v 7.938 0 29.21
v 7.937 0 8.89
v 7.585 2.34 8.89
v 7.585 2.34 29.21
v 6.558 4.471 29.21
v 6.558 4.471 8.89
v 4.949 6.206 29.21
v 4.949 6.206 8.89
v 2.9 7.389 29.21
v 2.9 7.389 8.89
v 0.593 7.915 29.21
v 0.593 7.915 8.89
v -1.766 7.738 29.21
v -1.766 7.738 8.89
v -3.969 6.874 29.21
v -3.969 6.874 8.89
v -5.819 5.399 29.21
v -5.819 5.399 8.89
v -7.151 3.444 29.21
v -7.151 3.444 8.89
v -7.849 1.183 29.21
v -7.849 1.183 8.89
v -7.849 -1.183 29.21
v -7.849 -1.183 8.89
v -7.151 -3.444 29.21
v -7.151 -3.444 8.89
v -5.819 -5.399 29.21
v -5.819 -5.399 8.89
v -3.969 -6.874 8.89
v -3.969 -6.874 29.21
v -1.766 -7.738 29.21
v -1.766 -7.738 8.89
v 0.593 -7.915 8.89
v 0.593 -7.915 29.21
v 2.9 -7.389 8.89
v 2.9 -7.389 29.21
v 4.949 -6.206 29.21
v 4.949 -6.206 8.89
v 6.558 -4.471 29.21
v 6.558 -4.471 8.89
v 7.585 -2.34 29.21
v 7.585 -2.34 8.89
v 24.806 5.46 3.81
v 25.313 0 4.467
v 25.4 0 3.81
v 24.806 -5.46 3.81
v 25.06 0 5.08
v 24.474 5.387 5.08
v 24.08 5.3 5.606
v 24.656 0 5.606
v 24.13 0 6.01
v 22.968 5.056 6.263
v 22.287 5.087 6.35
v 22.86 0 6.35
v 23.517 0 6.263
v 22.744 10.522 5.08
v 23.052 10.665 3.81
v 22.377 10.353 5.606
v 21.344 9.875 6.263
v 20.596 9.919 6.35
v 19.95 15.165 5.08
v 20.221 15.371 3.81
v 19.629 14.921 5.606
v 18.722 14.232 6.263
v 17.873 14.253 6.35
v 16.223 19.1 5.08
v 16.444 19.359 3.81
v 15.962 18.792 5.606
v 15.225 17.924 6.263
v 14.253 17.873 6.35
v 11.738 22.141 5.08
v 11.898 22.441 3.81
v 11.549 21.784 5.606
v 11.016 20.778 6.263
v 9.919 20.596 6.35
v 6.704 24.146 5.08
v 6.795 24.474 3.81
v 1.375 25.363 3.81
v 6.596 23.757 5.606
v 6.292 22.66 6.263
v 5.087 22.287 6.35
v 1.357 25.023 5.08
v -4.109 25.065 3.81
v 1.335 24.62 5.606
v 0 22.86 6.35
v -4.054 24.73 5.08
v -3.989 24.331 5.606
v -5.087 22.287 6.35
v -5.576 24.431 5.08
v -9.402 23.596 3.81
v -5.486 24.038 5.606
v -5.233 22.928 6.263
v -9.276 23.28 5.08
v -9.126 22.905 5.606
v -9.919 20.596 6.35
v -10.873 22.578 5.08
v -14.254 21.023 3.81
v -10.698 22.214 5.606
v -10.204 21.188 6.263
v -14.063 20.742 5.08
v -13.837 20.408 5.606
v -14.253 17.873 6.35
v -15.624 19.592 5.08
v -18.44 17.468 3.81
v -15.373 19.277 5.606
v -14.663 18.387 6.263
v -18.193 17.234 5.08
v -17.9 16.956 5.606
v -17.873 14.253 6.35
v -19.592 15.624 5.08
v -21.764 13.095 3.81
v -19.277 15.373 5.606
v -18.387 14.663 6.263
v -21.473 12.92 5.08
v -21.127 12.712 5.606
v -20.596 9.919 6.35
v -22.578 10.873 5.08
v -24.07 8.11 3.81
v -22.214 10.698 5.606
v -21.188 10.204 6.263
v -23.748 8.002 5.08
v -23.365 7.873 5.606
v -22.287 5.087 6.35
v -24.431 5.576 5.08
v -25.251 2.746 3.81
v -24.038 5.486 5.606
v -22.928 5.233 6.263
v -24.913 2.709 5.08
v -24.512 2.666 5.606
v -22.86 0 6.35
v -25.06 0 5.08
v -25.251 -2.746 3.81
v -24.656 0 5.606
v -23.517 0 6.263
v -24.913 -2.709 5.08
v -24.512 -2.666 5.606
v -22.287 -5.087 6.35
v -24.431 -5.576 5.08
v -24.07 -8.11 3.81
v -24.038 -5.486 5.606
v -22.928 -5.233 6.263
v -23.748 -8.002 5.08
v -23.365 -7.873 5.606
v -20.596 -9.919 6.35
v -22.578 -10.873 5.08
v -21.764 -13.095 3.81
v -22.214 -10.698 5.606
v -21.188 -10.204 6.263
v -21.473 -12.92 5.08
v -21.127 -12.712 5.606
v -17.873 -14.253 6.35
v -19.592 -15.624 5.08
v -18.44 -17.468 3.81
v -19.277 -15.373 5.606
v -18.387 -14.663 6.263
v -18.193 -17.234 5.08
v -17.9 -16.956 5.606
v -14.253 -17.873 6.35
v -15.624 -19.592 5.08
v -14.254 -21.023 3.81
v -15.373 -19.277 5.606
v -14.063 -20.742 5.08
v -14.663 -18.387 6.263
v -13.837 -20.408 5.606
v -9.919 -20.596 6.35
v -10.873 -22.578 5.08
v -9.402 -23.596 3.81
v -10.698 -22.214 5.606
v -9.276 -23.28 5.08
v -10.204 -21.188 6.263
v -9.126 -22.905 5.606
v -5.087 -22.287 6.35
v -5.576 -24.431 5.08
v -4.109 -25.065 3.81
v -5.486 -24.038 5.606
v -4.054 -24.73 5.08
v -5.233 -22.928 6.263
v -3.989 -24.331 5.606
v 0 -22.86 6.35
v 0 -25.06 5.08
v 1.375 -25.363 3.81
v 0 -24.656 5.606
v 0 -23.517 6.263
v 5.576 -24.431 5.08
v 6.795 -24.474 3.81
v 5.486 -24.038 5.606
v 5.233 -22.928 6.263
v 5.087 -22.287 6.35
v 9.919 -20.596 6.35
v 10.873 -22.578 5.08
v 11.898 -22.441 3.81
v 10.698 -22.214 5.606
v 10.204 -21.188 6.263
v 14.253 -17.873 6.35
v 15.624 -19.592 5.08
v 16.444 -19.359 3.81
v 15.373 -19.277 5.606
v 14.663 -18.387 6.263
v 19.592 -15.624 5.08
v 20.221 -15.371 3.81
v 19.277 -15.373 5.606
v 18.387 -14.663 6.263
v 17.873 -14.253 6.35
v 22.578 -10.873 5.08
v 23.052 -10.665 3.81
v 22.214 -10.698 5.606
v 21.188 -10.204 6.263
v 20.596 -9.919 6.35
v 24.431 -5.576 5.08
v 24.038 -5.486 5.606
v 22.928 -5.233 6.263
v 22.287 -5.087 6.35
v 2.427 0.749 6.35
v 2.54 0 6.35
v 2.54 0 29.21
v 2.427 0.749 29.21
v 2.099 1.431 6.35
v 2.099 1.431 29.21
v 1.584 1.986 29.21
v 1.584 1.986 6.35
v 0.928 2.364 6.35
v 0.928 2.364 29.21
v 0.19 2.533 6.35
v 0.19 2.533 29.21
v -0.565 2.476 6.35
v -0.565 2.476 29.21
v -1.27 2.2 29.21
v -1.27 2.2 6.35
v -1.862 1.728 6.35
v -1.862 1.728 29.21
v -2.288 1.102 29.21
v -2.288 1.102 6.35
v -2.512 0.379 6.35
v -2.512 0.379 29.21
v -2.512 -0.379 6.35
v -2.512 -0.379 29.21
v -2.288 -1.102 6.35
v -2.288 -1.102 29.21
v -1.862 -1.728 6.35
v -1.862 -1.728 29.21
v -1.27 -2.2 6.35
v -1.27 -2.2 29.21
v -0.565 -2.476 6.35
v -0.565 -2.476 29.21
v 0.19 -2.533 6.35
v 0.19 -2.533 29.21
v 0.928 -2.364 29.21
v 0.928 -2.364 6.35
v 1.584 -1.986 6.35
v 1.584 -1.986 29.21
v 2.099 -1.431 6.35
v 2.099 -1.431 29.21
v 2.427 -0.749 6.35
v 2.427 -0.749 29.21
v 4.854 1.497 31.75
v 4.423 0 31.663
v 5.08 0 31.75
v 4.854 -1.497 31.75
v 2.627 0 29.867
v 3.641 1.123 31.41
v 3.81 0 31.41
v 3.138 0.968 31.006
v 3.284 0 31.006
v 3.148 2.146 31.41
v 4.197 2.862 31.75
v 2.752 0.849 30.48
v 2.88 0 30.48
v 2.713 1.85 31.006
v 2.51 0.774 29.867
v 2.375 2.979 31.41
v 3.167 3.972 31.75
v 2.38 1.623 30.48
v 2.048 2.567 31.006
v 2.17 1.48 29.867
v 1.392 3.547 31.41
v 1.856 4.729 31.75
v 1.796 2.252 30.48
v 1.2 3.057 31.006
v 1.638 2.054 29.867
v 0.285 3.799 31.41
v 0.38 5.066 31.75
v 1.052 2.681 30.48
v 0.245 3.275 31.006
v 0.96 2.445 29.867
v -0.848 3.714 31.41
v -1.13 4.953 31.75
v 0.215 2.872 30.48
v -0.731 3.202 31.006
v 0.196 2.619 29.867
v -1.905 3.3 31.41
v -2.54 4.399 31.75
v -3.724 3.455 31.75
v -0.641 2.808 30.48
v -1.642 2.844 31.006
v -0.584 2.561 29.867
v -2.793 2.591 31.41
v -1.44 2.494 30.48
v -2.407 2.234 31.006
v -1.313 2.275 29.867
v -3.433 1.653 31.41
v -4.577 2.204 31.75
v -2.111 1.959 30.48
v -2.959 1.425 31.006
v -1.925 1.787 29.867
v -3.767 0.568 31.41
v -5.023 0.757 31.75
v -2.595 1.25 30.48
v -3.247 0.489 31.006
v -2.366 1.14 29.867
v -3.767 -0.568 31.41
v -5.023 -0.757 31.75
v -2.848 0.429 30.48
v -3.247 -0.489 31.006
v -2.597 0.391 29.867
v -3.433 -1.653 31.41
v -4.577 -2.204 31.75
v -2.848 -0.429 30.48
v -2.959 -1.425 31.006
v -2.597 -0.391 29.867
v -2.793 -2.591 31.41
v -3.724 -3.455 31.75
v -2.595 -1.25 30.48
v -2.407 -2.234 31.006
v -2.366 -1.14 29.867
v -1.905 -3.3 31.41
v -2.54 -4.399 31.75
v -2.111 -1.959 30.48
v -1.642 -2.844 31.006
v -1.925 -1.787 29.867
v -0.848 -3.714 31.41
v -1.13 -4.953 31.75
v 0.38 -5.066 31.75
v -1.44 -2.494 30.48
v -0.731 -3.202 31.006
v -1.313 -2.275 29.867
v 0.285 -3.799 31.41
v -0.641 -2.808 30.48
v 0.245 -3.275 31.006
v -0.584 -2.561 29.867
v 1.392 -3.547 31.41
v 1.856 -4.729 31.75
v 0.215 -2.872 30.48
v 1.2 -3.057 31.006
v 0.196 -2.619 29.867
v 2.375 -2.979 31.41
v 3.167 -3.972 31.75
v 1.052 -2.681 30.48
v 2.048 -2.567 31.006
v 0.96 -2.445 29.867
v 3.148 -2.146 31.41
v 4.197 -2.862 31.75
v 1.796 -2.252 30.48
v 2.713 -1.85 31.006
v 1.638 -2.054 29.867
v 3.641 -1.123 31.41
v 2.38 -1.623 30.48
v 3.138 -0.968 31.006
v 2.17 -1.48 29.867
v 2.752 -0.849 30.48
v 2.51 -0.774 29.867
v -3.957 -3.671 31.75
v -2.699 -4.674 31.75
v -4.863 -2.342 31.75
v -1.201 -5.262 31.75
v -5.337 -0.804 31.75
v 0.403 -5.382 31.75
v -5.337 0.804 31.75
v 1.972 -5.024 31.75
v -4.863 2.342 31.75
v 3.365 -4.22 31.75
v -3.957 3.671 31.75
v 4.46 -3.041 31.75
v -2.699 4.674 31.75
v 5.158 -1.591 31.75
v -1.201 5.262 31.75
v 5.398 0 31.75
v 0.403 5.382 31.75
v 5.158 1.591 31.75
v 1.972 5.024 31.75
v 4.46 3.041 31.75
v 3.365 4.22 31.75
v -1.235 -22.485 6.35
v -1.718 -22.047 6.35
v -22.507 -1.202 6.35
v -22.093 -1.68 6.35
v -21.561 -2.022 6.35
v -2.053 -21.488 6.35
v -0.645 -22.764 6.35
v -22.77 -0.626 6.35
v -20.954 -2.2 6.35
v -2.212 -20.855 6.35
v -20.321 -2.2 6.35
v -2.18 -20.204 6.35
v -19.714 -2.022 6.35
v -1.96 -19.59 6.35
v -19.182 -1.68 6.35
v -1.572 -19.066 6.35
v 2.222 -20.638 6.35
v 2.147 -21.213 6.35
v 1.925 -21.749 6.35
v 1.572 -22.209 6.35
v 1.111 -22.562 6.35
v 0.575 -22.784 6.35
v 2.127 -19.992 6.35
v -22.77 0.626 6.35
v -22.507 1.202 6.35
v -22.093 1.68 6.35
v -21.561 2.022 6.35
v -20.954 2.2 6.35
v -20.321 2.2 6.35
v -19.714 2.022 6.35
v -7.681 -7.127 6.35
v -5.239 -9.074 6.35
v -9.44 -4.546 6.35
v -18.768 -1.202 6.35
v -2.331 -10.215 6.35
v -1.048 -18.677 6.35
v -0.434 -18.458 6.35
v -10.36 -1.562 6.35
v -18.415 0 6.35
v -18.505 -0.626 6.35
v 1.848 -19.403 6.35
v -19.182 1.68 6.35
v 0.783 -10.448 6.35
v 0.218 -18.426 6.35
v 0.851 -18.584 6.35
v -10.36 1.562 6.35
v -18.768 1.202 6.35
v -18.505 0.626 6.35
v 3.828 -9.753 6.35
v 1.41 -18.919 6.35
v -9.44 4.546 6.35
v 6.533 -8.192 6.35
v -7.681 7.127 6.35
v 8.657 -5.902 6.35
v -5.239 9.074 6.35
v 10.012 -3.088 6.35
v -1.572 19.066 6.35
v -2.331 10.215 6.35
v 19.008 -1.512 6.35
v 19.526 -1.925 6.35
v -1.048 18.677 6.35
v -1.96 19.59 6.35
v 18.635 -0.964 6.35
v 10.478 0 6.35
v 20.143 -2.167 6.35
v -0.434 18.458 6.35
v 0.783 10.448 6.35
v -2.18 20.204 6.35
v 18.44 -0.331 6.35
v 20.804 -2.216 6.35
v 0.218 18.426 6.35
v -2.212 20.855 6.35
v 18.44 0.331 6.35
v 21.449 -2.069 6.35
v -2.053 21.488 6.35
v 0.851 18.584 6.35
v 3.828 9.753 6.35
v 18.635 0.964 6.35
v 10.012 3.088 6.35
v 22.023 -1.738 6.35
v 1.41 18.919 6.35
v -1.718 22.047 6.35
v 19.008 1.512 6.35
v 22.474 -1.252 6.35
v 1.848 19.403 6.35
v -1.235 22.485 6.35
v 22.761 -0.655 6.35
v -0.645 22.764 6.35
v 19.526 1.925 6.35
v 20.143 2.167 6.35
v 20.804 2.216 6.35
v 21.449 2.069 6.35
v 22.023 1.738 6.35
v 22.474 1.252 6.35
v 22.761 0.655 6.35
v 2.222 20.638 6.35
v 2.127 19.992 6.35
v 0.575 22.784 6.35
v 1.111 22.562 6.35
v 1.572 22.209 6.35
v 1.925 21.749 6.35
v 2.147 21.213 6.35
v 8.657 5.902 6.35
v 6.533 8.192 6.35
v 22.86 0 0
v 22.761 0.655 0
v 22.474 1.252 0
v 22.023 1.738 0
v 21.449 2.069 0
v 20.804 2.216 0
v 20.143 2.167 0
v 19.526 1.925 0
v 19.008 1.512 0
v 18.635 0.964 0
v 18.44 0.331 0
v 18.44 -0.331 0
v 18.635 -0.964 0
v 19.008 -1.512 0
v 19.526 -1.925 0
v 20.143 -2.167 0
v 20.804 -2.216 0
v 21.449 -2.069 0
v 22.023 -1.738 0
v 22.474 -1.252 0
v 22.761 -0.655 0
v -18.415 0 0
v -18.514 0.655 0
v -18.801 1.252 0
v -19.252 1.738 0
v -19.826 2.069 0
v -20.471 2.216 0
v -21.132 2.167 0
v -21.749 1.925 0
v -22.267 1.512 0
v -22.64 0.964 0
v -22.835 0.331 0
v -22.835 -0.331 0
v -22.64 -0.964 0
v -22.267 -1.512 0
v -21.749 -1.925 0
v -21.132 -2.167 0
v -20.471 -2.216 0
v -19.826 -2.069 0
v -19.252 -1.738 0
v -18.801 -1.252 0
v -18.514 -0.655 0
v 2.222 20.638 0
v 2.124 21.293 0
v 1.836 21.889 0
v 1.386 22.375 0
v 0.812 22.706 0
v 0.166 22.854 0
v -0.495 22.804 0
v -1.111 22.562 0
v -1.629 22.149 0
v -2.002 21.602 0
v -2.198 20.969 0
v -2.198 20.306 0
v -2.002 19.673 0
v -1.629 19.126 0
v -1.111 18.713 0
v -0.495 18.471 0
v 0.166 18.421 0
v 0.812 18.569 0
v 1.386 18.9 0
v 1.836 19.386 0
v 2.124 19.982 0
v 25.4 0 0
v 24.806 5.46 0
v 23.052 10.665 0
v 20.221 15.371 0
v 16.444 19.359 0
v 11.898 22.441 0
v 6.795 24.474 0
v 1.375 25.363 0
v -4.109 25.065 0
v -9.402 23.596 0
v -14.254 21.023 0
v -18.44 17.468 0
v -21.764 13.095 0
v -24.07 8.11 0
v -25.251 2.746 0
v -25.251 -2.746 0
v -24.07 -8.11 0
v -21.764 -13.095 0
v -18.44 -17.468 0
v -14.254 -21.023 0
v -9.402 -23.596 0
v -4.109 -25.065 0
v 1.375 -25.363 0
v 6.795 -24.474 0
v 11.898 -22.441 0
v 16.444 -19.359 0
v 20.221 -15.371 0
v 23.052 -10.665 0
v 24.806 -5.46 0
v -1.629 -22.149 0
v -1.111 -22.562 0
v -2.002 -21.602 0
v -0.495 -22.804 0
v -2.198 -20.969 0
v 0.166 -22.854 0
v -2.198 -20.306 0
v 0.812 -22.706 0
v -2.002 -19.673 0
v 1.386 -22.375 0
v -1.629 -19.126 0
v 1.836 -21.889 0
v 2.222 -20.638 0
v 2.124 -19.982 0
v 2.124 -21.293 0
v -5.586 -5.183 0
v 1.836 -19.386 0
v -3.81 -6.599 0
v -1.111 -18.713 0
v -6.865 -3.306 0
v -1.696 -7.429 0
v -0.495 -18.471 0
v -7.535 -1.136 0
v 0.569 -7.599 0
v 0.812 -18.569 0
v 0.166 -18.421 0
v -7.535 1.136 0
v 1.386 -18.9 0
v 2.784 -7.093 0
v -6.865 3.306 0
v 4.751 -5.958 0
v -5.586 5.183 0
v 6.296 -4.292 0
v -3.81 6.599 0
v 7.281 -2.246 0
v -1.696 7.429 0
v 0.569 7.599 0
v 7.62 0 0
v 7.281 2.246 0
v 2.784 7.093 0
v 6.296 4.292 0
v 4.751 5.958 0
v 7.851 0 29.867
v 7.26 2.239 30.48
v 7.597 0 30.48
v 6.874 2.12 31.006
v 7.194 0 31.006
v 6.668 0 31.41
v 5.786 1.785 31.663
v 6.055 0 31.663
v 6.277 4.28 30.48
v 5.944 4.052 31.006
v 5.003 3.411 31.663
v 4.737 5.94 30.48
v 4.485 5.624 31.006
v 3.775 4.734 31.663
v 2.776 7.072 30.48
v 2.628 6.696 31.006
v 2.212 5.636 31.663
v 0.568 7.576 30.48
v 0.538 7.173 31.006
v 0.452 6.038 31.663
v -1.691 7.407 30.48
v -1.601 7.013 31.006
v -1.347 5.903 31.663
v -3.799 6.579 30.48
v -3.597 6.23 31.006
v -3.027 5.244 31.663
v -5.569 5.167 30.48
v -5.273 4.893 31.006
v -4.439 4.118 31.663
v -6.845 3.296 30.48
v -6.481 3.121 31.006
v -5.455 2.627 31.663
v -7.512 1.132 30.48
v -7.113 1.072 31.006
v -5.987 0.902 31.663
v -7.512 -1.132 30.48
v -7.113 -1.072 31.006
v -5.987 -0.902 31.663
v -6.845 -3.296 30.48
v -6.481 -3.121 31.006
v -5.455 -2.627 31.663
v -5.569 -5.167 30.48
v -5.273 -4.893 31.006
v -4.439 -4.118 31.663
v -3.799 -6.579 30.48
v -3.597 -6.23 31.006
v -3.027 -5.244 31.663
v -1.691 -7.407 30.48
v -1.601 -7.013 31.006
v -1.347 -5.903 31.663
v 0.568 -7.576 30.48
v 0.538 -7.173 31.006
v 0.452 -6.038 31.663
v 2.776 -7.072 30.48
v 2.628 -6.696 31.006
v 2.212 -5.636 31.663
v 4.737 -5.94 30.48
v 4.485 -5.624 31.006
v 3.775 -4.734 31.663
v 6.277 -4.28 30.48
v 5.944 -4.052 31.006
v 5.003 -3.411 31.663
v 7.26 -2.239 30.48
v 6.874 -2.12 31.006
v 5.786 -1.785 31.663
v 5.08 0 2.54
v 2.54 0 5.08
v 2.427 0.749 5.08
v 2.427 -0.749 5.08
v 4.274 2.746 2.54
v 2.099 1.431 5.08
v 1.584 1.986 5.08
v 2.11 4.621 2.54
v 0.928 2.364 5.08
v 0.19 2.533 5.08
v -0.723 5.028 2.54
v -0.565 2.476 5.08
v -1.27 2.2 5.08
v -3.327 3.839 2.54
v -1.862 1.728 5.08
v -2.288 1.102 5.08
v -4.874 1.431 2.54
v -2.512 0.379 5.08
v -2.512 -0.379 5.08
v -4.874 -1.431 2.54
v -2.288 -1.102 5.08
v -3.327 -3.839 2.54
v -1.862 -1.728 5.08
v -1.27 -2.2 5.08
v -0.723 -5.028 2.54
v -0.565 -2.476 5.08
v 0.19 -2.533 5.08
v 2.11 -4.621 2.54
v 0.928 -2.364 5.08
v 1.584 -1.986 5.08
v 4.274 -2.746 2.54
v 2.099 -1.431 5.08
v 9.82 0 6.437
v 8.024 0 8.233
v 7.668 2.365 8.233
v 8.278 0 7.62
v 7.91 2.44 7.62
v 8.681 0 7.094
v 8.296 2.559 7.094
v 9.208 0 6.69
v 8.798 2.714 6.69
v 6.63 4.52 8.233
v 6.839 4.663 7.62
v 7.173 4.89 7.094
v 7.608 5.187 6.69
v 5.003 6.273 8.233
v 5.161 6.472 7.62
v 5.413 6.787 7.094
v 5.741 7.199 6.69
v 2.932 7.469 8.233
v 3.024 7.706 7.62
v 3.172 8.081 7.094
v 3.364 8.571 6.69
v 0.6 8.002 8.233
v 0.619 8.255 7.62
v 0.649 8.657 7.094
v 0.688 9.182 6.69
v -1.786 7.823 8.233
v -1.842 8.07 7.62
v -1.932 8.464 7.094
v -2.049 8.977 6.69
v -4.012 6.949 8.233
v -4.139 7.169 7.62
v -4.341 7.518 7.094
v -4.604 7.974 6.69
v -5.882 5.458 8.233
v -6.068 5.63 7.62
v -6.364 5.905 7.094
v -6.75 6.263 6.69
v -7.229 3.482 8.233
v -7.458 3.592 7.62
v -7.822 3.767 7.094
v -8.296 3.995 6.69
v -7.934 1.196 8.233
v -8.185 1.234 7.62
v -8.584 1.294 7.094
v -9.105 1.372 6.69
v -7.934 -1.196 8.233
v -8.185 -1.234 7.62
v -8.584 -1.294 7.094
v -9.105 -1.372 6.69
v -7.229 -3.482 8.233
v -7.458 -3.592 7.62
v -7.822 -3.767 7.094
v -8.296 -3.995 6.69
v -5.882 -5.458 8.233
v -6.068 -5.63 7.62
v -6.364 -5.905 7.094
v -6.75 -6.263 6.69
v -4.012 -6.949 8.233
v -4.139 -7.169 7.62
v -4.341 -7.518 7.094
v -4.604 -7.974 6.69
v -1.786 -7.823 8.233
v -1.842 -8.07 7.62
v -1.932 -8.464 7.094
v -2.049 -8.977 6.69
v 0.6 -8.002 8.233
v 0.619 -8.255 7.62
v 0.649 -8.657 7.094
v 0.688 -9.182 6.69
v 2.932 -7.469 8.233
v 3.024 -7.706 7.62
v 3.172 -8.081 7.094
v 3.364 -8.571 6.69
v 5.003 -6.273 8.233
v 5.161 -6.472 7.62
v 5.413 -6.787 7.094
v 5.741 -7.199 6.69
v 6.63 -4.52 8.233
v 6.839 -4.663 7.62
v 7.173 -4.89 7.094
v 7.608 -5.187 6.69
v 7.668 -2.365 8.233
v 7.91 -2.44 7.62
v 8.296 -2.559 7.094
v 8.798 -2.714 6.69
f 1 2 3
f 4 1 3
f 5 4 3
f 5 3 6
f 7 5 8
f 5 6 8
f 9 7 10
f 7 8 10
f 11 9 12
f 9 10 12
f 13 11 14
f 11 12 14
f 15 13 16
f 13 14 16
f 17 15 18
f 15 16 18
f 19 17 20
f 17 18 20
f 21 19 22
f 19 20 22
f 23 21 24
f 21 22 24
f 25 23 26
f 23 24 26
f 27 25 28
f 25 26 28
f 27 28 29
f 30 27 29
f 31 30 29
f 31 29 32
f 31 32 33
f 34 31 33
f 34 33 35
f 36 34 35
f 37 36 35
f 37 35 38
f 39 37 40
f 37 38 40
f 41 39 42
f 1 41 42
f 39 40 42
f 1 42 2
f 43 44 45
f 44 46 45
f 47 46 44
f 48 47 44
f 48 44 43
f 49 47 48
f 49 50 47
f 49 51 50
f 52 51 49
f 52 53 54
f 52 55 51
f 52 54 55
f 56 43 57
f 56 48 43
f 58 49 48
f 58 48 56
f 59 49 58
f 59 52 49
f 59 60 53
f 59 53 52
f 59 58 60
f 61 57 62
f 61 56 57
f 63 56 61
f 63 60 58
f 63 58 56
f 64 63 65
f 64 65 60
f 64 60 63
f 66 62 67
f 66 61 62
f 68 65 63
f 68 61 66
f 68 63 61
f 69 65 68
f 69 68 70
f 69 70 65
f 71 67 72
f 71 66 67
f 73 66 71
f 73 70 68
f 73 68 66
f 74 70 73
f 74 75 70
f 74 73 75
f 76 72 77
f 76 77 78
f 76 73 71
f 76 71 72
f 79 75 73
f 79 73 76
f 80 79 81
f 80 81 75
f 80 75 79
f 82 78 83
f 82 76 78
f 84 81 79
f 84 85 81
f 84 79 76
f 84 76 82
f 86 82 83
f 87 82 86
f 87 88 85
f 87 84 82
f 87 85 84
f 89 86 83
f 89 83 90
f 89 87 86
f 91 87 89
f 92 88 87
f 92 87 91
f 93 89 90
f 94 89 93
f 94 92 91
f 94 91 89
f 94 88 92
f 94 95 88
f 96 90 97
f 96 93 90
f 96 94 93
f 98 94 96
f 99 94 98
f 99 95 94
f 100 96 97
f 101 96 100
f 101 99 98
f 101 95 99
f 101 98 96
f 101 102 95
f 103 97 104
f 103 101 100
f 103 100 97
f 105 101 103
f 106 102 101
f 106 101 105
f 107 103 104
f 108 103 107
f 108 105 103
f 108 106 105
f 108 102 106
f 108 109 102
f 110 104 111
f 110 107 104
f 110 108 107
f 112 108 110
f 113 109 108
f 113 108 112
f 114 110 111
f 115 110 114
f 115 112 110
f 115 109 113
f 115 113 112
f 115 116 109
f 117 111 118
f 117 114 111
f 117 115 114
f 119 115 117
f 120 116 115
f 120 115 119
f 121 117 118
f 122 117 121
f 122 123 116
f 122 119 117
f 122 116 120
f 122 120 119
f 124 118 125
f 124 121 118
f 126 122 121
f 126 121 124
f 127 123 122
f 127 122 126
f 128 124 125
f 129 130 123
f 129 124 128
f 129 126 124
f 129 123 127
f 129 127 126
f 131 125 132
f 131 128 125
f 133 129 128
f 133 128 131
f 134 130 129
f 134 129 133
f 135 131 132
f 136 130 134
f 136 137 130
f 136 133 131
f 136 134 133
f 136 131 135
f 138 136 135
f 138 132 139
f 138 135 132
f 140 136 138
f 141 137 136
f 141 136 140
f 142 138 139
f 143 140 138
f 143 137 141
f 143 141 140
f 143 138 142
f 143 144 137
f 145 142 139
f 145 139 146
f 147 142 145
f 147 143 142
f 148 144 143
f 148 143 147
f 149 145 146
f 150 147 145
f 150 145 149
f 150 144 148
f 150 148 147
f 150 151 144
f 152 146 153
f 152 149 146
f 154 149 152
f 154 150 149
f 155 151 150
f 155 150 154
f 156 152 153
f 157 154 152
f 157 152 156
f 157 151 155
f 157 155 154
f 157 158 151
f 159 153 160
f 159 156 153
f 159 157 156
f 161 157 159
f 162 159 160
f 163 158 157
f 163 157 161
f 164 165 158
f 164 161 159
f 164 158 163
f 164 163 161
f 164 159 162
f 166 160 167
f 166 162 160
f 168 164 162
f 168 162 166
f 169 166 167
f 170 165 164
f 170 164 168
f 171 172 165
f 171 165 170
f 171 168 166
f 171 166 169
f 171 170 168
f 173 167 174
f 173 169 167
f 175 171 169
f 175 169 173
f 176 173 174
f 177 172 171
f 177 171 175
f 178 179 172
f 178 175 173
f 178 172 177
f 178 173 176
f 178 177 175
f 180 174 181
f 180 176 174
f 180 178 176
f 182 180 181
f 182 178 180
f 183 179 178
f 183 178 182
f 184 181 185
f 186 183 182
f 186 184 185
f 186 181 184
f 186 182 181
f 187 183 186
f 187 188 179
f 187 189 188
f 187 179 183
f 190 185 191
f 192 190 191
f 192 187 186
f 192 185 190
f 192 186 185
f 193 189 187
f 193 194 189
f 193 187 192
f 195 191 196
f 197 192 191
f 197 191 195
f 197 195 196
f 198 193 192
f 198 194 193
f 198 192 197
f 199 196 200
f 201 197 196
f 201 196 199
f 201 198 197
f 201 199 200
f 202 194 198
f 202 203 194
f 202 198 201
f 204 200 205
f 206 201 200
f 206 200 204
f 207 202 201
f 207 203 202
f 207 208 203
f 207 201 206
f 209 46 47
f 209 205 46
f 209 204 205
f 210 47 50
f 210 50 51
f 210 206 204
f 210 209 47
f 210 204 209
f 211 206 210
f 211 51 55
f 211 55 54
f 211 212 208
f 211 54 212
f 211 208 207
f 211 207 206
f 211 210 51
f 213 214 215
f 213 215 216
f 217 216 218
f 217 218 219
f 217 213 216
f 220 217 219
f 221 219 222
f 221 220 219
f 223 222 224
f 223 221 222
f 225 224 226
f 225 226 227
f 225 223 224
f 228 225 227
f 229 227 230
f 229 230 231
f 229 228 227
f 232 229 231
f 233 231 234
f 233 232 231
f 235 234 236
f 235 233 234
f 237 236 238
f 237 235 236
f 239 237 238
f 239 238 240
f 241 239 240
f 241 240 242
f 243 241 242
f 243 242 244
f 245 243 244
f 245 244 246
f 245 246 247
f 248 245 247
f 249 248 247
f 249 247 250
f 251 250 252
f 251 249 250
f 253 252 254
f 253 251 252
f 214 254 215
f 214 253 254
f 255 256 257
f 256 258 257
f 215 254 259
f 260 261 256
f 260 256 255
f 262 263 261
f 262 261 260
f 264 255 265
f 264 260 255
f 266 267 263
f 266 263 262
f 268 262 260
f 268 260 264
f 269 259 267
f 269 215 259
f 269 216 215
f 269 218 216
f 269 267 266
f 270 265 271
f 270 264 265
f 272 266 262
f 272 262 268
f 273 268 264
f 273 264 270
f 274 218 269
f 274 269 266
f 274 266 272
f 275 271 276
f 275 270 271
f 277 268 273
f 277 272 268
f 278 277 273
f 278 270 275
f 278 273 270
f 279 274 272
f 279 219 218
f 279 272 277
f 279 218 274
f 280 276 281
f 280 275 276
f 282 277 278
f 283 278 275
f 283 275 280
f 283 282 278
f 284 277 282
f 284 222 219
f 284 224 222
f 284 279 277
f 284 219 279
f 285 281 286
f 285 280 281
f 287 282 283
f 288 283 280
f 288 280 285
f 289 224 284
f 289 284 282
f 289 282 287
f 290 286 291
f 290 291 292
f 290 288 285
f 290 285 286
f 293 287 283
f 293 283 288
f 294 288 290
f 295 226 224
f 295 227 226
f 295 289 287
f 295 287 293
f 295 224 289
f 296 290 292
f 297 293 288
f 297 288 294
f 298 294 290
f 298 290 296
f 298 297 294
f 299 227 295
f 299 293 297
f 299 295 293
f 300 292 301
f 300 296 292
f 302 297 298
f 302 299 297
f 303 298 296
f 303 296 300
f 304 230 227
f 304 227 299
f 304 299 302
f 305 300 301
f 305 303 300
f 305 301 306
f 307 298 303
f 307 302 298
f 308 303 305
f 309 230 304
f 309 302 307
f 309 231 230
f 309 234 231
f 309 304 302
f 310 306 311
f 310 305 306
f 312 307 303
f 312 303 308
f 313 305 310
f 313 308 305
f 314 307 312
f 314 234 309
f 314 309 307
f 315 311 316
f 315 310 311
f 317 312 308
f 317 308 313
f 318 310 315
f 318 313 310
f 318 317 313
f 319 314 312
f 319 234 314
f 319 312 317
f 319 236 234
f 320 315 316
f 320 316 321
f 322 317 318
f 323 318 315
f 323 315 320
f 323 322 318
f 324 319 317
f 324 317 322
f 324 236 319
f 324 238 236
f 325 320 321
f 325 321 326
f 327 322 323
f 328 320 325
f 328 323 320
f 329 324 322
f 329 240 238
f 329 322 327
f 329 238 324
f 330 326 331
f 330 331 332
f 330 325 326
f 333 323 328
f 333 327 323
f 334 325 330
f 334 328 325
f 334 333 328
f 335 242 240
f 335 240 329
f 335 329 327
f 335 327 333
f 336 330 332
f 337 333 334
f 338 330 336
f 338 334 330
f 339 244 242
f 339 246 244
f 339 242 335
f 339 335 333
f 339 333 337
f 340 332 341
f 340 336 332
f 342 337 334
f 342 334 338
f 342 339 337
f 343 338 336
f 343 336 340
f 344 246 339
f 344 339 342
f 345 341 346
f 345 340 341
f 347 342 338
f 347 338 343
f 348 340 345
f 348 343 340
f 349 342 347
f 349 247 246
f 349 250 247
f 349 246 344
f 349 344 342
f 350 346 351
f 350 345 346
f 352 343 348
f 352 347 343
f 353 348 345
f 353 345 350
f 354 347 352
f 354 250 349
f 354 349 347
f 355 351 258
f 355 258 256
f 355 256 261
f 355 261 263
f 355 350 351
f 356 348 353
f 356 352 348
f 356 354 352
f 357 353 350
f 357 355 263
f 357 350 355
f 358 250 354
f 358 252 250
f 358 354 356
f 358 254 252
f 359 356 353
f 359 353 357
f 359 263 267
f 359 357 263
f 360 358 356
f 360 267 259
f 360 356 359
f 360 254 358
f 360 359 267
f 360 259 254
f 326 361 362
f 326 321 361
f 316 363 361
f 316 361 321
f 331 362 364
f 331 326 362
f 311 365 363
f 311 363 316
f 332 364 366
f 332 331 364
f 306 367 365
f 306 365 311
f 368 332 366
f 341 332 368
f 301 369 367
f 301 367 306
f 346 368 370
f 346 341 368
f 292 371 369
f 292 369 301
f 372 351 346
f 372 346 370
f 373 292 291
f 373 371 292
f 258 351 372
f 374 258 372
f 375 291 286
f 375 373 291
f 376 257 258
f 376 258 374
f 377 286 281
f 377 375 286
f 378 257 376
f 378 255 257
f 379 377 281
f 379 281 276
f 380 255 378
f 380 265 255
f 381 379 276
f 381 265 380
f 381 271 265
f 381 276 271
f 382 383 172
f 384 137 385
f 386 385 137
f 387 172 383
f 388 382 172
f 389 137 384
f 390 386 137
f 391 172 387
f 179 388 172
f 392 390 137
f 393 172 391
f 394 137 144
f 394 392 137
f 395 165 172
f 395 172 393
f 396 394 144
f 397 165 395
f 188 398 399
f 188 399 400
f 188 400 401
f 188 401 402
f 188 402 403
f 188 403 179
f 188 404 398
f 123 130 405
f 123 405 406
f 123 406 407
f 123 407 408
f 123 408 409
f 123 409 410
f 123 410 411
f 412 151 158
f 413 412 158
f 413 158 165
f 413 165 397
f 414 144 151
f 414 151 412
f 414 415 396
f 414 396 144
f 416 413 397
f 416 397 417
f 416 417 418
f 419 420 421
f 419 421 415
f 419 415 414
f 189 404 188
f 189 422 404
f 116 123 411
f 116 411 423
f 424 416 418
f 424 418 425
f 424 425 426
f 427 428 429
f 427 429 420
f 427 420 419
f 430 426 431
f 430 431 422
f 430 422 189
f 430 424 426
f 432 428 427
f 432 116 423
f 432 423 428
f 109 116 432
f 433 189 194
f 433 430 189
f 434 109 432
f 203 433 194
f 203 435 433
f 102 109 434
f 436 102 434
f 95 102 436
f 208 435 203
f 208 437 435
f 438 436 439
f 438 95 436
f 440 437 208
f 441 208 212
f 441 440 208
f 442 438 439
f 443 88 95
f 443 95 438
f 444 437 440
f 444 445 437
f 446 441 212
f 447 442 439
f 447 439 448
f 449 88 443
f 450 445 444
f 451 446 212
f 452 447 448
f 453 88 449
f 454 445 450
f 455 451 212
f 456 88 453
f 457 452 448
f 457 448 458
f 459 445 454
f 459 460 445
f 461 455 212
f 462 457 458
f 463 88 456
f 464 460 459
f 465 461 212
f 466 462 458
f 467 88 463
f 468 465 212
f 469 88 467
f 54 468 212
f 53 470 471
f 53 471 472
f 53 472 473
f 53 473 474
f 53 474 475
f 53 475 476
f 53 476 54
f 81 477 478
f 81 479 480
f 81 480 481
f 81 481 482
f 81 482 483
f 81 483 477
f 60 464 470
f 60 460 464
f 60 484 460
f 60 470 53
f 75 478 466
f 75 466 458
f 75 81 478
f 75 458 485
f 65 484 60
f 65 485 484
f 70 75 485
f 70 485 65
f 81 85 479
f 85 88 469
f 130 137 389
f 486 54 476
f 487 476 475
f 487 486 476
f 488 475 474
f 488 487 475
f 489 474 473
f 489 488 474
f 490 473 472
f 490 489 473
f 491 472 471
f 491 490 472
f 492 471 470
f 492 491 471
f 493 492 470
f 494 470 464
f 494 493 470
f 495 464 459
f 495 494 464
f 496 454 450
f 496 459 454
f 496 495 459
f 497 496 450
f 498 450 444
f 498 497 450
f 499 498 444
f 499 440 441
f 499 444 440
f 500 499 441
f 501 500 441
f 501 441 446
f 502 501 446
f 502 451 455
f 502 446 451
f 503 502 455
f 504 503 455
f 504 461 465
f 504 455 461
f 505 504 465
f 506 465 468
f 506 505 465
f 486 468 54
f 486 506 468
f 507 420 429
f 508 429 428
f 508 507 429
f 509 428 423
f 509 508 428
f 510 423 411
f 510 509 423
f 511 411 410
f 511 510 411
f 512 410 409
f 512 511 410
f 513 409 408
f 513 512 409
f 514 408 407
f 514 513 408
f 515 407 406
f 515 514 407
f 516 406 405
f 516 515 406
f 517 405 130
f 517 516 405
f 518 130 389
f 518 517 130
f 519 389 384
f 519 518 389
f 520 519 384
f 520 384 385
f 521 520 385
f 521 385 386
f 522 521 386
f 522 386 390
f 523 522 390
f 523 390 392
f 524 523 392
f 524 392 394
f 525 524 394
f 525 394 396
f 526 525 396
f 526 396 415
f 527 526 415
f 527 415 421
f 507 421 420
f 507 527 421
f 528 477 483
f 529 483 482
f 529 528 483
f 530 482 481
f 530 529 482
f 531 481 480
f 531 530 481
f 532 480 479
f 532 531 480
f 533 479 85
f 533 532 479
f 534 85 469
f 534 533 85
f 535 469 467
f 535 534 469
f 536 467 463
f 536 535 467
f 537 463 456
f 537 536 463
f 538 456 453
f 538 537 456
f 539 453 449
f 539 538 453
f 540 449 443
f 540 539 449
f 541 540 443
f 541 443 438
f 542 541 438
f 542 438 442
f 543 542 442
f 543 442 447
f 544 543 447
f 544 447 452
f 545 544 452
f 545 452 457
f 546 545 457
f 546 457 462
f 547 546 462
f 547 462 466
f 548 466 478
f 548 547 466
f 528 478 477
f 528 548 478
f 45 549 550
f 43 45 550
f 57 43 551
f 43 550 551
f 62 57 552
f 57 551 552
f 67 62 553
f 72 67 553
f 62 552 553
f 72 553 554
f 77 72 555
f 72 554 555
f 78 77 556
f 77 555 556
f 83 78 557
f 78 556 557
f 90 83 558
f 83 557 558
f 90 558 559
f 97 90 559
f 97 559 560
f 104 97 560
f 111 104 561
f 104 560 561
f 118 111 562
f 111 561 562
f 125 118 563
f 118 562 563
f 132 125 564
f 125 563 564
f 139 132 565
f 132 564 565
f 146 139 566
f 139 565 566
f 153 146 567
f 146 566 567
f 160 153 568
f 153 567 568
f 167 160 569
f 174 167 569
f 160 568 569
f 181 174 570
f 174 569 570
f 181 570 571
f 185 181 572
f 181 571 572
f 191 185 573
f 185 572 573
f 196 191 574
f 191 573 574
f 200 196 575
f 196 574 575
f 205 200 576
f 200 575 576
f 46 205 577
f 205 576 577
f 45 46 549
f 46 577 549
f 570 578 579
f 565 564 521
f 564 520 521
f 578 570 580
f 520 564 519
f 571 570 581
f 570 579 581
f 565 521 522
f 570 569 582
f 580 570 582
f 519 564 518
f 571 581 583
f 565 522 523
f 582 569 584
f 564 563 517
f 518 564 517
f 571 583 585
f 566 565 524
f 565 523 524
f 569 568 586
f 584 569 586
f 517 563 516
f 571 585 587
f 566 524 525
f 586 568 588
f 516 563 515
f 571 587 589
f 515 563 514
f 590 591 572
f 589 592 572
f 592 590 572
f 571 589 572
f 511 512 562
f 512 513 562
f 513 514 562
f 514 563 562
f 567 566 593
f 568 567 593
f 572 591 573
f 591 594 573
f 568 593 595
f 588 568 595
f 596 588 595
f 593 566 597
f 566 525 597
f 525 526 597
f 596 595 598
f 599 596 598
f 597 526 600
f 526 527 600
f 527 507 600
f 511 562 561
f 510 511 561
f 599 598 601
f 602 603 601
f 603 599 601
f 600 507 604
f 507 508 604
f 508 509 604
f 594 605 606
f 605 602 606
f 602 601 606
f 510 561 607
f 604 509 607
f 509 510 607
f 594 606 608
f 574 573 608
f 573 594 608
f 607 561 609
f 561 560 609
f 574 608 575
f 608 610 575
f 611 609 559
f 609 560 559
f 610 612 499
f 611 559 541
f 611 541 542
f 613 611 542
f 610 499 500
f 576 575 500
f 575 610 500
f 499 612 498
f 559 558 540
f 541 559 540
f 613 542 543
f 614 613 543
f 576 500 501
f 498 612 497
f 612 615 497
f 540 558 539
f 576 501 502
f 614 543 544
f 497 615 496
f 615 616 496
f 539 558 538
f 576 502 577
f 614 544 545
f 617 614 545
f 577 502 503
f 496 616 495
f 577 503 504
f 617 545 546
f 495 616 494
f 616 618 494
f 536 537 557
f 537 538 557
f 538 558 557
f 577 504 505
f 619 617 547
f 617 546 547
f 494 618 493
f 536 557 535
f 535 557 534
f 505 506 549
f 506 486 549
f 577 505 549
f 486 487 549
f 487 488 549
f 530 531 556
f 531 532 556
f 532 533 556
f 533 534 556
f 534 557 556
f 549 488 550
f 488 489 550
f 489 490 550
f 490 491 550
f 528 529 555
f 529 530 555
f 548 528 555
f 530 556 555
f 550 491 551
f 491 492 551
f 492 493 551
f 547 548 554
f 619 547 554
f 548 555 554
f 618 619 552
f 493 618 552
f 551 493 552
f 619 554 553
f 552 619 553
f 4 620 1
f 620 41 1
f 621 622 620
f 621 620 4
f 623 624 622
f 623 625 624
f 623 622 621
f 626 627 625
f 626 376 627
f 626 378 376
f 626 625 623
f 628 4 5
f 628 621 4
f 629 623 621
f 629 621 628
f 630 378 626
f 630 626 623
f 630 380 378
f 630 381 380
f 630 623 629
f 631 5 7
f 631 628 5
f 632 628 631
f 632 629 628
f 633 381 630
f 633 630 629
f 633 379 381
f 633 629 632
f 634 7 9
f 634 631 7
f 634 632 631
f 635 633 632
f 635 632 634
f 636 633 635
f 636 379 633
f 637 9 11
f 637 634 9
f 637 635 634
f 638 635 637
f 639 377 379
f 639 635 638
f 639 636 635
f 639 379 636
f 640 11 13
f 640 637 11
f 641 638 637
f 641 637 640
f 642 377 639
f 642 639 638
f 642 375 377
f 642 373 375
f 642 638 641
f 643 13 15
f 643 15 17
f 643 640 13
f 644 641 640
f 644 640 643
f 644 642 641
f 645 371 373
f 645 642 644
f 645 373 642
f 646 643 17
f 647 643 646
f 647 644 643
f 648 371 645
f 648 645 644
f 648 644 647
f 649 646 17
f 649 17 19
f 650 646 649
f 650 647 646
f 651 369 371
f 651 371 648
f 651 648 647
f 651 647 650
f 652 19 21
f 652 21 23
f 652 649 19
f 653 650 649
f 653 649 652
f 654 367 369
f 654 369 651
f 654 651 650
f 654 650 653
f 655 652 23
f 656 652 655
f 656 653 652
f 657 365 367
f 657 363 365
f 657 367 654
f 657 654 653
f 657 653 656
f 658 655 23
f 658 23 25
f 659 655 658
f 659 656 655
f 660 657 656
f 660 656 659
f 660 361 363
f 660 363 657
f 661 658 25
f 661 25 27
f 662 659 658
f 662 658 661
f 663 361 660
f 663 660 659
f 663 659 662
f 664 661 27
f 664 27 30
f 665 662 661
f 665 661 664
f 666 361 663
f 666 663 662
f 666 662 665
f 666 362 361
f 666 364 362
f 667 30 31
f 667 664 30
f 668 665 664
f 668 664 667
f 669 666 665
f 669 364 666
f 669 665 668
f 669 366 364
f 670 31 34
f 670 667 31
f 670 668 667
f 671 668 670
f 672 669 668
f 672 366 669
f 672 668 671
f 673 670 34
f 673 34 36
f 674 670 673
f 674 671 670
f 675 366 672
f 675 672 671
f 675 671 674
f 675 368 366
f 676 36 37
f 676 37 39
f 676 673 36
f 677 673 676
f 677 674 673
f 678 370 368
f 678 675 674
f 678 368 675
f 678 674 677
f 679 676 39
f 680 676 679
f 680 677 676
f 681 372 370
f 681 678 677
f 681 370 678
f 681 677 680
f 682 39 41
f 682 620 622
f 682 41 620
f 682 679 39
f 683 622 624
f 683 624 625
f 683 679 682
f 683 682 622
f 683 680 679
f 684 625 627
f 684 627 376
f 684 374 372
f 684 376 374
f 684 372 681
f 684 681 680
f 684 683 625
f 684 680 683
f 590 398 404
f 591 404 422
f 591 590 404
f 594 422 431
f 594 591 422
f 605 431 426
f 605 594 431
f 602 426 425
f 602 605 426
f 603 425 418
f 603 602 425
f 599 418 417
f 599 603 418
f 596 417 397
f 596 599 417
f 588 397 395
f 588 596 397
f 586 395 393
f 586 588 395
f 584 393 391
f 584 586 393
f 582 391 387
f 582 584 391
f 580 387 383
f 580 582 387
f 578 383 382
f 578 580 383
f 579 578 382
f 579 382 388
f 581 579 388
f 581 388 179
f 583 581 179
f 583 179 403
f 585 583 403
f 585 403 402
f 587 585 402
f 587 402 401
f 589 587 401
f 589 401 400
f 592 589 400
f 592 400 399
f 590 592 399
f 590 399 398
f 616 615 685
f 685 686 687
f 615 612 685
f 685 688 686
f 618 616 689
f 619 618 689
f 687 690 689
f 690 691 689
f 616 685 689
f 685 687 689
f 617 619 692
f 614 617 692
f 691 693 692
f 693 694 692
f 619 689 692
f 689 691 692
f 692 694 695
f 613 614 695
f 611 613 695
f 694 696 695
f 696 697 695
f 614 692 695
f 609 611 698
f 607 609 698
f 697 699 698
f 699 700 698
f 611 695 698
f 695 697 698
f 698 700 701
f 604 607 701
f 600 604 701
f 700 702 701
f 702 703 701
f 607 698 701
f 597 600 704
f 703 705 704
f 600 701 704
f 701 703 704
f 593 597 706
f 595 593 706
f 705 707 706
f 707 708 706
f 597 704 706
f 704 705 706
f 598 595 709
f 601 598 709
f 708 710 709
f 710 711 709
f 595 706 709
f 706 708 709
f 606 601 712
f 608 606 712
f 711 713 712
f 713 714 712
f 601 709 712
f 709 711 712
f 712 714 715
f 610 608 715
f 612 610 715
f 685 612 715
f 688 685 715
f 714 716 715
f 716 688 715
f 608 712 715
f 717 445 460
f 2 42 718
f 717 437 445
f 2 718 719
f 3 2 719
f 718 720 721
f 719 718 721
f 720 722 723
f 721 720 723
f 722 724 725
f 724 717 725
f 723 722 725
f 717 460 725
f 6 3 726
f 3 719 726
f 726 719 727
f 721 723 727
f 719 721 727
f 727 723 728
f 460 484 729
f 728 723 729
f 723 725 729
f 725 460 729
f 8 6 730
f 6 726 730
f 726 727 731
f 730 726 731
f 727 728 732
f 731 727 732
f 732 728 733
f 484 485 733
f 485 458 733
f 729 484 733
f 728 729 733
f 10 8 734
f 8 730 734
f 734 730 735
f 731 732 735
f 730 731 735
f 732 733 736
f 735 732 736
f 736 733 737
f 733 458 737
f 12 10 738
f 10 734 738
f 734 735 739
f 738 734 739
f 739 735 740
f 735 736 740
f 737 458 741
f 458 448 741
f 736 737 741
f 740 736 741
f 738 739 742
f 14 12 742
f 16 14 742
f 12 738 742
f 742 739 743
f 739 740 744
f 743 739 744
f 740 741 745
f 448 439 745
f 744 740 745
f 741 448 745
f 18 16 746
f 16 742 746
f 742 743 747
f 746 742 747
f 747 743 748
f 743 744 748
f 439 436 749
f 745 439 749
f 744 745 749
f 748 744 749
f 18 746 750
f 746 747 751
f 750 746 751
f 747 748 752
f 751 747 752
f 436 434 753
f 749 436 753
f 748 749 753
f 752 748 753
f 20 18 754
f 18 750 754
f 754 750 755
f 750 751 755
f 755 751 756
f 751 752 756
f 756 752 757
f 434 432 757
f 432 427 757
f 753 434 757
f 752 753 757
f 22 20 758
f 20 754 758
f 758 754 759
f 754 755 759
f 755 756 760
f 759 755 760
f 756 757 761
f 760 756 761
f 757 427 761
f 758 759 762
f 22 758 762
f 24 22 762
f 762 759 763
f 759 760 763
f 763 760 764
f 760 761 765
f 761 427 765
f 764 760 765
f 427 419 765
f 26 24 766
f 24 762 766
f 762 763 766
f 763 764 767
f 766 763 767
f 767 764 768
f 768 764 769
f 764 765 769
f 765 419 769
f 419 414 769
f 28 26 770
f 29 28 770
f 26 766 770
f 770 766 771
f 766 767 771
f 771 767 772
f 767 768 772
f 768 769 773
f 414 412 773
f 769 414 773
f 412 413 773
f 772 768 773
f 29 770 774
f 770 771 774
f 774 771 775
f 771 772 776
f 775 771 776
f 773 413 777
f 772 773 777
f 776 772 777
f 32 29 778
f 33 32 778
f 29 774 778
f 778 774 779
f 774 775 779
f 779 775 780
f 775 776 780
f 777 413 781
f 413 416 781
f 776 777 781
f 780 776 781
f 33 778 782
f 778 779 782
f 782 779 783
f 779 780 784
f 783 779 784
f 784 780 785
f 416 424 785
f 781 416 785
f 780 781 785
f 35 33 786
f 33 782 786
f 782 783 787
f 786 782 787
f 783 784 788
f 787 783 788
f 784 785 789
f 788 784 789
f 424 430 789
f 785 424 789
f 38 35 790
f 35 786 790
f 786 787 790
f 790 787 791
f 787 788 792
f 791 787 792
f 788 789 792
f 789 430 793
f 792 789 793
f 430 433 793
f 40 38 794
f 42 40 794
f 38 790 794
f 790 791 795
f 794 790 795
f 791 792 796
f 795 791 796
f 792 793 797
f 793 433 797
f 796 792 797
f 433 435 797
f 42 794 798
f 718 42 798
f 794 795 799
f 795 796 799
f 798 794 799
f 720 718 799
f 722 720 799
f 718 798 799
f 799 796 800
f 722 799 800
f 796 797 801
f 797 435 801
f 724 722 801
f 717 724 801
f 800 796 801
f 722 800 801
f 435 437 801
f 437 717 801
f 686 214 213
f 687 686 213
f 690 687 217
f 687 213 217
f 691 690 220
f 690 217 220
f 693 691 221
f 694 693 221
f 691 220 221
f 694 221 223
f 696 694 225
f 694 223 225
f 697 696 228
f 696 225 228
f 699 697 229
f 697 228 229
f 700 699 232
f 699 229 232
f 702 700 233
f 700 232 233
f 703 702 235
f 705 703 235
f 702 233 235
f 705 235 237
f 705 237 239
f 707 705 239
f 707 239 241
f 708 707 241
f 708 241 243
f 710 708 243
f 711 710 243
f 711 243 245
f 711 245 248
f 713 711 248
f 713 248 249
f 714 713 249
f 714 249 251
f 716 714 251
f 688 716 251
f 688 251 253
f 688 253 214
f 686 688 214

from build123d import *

# Parameters (mm, degrees)
F0_R     = 25.4
F0_R_2   = 2.2225
F1_DEPTH = 6.35
F3_R     = 2.54
F2_R     = 2.54
F4_DEPTH = 25.4
F2_R_2   = 7.9375
F5_DEPTH = 25.4
F6_R     = 2.54
F7_DEPTH = 25.4
F8_R     = 2.54
F9_SIZE  = 5.08


with BuildPart() as f1:
    # F0 (on Top) → F1 (new body)
    with BuildSketch(Plane.XY):
        Circle(F0_R)
        with Locations((0, -20.6375)):
            Circle(F0_R_2, mode=Mode.SUBTRACT)
        with Locations((-20.6375, 0)):
            Circle(F0_R_2, mode=Mode.SUBTRACT)
        with Locations((20.6375, 0)):
            Circle(F0_R_2, mode=Mode.SUBTRACT)
        with BuildLine():
            Line((-4.064, 10.31875), (-4.064, 0))
            ThreePointArc((-4.064, 0), (0, -4.064), (4.064, 0))
            Line((4.064, 0), (4.064, 10.31875))
            ThreePointArc((4.064, 10.31875), (7.239, 14.1114143812), (10.414, 10.31875))
            Line((10.414, 10.31875), (10.414, 0))
            ThreePointArc((10.414, 0), (0, -10.414), (-10.414, 0))
            Line((-10.414, 0), (-10.414, 10.31875))
            ThreePointArc((-10.414, 10.31875), (-7.239, 14.1114143812), (-4.064, 10.31875))
        make_face(mode=Mode.SUBTRACT)
        with Locations((0, 20.6375)):
            Circle(F0_R_2, mode=Mode.SUBTRACT)
        with BuildLine():
            ThreePointArc((4.064, 0), (0, -4.064), (-4.064, 0))
            Line((-4.064, 0), (-4.064, 10.31875))
            ThreePointArc((-4.064, 10.31875), (-7.239, 14.1114143812), (-10.414, 10.31875))
            Line((-10.414, 10.31875), (-10.414, 0))
            ThreePointArc((-10.414, 0), (0, -10.414), (10.414, 0))
            Line((10.414, 0), (10.414, 10.31875))
            ThreePointArc((10.414, 10.31875), (7.239, 14.1114143812), (4.064, 10.31875))
            Line((4.064, 10.31875), (4.064, 0))
        make_face()
        with Locations((0, -20.6375)):
            Circle(F0_R_2)
        with Locations((-20.6375, 0)):
            Circle(F0_R_2)
        with Locations((0, 20.6375)):
            Circle(F0_R_2)
        with Locations((20.6375, 0)):
            Circle(F0_R_2)
    extrude(amount=F1_DEPTH)

    # F3
    f3_edges = [f1.edges().sort_by_distance(p)[0] for p in [
        (-25.4, 0, 6.35),
    ]]
    fillet(f3_edges, radius=F3_R)

    # F2 (on face) → F4 (cut)
    with BuildSketch(Plane.XY.offset(6.35)):
        Circle(F2_R)
    extrude(amount=-F4_DEPTH, mode=Mode.SUBTRACT)

    # F2 (on face) → F5 (join)
    with BuildSketch(Plane.XY.offset(6.35)):
        Circle(F2_R_2)
        Circle(F2_R, mode=Mode.SUBTRACT)
    extrude(amount=F5_DEPTH)

    # F6
    f6_edges = [f1.edges().sort_by_distance(p)[0] for p in [
        (-22.86, 0, 6.35),
        (-7.9375, 0, 6.35),
    ]]
    fillet(f6_edges, radius=F6_R)

    # F0 (on Top) → F7 (cut)
    with BuildSketch(Plane.XY):
        with Locations((20.6375, 0)):
            Circle(F0_R_2)
        with Locations((0, 20.6375)):
            Circle(F0_R_2)
        with Locations((-20.6375, 0)):
            Circle(F0_R_2)
        with Locations((0, -20.6375)):
            Circle(F0_R_2)
    extrude(amount=F7_DEPTH, mode=Mode.SUBTRACT)

    # F8
    f8_edges = [f1.edges().sort_by_distance(p)[0] for p in [
        (-7.9375, 0, 31.75),
        (-2.54, 0, 31.75),
    ]]
    fillet(f8_edges, radius=F8_R)

    # F9
    f9_edges = [f1.edges().sort_by_distance(p)[0] for p in [
        (-2.54, 0, 0),
    ]]
    chamfer(f9_edges, length=F9_SIZE)


solid = f1.part
